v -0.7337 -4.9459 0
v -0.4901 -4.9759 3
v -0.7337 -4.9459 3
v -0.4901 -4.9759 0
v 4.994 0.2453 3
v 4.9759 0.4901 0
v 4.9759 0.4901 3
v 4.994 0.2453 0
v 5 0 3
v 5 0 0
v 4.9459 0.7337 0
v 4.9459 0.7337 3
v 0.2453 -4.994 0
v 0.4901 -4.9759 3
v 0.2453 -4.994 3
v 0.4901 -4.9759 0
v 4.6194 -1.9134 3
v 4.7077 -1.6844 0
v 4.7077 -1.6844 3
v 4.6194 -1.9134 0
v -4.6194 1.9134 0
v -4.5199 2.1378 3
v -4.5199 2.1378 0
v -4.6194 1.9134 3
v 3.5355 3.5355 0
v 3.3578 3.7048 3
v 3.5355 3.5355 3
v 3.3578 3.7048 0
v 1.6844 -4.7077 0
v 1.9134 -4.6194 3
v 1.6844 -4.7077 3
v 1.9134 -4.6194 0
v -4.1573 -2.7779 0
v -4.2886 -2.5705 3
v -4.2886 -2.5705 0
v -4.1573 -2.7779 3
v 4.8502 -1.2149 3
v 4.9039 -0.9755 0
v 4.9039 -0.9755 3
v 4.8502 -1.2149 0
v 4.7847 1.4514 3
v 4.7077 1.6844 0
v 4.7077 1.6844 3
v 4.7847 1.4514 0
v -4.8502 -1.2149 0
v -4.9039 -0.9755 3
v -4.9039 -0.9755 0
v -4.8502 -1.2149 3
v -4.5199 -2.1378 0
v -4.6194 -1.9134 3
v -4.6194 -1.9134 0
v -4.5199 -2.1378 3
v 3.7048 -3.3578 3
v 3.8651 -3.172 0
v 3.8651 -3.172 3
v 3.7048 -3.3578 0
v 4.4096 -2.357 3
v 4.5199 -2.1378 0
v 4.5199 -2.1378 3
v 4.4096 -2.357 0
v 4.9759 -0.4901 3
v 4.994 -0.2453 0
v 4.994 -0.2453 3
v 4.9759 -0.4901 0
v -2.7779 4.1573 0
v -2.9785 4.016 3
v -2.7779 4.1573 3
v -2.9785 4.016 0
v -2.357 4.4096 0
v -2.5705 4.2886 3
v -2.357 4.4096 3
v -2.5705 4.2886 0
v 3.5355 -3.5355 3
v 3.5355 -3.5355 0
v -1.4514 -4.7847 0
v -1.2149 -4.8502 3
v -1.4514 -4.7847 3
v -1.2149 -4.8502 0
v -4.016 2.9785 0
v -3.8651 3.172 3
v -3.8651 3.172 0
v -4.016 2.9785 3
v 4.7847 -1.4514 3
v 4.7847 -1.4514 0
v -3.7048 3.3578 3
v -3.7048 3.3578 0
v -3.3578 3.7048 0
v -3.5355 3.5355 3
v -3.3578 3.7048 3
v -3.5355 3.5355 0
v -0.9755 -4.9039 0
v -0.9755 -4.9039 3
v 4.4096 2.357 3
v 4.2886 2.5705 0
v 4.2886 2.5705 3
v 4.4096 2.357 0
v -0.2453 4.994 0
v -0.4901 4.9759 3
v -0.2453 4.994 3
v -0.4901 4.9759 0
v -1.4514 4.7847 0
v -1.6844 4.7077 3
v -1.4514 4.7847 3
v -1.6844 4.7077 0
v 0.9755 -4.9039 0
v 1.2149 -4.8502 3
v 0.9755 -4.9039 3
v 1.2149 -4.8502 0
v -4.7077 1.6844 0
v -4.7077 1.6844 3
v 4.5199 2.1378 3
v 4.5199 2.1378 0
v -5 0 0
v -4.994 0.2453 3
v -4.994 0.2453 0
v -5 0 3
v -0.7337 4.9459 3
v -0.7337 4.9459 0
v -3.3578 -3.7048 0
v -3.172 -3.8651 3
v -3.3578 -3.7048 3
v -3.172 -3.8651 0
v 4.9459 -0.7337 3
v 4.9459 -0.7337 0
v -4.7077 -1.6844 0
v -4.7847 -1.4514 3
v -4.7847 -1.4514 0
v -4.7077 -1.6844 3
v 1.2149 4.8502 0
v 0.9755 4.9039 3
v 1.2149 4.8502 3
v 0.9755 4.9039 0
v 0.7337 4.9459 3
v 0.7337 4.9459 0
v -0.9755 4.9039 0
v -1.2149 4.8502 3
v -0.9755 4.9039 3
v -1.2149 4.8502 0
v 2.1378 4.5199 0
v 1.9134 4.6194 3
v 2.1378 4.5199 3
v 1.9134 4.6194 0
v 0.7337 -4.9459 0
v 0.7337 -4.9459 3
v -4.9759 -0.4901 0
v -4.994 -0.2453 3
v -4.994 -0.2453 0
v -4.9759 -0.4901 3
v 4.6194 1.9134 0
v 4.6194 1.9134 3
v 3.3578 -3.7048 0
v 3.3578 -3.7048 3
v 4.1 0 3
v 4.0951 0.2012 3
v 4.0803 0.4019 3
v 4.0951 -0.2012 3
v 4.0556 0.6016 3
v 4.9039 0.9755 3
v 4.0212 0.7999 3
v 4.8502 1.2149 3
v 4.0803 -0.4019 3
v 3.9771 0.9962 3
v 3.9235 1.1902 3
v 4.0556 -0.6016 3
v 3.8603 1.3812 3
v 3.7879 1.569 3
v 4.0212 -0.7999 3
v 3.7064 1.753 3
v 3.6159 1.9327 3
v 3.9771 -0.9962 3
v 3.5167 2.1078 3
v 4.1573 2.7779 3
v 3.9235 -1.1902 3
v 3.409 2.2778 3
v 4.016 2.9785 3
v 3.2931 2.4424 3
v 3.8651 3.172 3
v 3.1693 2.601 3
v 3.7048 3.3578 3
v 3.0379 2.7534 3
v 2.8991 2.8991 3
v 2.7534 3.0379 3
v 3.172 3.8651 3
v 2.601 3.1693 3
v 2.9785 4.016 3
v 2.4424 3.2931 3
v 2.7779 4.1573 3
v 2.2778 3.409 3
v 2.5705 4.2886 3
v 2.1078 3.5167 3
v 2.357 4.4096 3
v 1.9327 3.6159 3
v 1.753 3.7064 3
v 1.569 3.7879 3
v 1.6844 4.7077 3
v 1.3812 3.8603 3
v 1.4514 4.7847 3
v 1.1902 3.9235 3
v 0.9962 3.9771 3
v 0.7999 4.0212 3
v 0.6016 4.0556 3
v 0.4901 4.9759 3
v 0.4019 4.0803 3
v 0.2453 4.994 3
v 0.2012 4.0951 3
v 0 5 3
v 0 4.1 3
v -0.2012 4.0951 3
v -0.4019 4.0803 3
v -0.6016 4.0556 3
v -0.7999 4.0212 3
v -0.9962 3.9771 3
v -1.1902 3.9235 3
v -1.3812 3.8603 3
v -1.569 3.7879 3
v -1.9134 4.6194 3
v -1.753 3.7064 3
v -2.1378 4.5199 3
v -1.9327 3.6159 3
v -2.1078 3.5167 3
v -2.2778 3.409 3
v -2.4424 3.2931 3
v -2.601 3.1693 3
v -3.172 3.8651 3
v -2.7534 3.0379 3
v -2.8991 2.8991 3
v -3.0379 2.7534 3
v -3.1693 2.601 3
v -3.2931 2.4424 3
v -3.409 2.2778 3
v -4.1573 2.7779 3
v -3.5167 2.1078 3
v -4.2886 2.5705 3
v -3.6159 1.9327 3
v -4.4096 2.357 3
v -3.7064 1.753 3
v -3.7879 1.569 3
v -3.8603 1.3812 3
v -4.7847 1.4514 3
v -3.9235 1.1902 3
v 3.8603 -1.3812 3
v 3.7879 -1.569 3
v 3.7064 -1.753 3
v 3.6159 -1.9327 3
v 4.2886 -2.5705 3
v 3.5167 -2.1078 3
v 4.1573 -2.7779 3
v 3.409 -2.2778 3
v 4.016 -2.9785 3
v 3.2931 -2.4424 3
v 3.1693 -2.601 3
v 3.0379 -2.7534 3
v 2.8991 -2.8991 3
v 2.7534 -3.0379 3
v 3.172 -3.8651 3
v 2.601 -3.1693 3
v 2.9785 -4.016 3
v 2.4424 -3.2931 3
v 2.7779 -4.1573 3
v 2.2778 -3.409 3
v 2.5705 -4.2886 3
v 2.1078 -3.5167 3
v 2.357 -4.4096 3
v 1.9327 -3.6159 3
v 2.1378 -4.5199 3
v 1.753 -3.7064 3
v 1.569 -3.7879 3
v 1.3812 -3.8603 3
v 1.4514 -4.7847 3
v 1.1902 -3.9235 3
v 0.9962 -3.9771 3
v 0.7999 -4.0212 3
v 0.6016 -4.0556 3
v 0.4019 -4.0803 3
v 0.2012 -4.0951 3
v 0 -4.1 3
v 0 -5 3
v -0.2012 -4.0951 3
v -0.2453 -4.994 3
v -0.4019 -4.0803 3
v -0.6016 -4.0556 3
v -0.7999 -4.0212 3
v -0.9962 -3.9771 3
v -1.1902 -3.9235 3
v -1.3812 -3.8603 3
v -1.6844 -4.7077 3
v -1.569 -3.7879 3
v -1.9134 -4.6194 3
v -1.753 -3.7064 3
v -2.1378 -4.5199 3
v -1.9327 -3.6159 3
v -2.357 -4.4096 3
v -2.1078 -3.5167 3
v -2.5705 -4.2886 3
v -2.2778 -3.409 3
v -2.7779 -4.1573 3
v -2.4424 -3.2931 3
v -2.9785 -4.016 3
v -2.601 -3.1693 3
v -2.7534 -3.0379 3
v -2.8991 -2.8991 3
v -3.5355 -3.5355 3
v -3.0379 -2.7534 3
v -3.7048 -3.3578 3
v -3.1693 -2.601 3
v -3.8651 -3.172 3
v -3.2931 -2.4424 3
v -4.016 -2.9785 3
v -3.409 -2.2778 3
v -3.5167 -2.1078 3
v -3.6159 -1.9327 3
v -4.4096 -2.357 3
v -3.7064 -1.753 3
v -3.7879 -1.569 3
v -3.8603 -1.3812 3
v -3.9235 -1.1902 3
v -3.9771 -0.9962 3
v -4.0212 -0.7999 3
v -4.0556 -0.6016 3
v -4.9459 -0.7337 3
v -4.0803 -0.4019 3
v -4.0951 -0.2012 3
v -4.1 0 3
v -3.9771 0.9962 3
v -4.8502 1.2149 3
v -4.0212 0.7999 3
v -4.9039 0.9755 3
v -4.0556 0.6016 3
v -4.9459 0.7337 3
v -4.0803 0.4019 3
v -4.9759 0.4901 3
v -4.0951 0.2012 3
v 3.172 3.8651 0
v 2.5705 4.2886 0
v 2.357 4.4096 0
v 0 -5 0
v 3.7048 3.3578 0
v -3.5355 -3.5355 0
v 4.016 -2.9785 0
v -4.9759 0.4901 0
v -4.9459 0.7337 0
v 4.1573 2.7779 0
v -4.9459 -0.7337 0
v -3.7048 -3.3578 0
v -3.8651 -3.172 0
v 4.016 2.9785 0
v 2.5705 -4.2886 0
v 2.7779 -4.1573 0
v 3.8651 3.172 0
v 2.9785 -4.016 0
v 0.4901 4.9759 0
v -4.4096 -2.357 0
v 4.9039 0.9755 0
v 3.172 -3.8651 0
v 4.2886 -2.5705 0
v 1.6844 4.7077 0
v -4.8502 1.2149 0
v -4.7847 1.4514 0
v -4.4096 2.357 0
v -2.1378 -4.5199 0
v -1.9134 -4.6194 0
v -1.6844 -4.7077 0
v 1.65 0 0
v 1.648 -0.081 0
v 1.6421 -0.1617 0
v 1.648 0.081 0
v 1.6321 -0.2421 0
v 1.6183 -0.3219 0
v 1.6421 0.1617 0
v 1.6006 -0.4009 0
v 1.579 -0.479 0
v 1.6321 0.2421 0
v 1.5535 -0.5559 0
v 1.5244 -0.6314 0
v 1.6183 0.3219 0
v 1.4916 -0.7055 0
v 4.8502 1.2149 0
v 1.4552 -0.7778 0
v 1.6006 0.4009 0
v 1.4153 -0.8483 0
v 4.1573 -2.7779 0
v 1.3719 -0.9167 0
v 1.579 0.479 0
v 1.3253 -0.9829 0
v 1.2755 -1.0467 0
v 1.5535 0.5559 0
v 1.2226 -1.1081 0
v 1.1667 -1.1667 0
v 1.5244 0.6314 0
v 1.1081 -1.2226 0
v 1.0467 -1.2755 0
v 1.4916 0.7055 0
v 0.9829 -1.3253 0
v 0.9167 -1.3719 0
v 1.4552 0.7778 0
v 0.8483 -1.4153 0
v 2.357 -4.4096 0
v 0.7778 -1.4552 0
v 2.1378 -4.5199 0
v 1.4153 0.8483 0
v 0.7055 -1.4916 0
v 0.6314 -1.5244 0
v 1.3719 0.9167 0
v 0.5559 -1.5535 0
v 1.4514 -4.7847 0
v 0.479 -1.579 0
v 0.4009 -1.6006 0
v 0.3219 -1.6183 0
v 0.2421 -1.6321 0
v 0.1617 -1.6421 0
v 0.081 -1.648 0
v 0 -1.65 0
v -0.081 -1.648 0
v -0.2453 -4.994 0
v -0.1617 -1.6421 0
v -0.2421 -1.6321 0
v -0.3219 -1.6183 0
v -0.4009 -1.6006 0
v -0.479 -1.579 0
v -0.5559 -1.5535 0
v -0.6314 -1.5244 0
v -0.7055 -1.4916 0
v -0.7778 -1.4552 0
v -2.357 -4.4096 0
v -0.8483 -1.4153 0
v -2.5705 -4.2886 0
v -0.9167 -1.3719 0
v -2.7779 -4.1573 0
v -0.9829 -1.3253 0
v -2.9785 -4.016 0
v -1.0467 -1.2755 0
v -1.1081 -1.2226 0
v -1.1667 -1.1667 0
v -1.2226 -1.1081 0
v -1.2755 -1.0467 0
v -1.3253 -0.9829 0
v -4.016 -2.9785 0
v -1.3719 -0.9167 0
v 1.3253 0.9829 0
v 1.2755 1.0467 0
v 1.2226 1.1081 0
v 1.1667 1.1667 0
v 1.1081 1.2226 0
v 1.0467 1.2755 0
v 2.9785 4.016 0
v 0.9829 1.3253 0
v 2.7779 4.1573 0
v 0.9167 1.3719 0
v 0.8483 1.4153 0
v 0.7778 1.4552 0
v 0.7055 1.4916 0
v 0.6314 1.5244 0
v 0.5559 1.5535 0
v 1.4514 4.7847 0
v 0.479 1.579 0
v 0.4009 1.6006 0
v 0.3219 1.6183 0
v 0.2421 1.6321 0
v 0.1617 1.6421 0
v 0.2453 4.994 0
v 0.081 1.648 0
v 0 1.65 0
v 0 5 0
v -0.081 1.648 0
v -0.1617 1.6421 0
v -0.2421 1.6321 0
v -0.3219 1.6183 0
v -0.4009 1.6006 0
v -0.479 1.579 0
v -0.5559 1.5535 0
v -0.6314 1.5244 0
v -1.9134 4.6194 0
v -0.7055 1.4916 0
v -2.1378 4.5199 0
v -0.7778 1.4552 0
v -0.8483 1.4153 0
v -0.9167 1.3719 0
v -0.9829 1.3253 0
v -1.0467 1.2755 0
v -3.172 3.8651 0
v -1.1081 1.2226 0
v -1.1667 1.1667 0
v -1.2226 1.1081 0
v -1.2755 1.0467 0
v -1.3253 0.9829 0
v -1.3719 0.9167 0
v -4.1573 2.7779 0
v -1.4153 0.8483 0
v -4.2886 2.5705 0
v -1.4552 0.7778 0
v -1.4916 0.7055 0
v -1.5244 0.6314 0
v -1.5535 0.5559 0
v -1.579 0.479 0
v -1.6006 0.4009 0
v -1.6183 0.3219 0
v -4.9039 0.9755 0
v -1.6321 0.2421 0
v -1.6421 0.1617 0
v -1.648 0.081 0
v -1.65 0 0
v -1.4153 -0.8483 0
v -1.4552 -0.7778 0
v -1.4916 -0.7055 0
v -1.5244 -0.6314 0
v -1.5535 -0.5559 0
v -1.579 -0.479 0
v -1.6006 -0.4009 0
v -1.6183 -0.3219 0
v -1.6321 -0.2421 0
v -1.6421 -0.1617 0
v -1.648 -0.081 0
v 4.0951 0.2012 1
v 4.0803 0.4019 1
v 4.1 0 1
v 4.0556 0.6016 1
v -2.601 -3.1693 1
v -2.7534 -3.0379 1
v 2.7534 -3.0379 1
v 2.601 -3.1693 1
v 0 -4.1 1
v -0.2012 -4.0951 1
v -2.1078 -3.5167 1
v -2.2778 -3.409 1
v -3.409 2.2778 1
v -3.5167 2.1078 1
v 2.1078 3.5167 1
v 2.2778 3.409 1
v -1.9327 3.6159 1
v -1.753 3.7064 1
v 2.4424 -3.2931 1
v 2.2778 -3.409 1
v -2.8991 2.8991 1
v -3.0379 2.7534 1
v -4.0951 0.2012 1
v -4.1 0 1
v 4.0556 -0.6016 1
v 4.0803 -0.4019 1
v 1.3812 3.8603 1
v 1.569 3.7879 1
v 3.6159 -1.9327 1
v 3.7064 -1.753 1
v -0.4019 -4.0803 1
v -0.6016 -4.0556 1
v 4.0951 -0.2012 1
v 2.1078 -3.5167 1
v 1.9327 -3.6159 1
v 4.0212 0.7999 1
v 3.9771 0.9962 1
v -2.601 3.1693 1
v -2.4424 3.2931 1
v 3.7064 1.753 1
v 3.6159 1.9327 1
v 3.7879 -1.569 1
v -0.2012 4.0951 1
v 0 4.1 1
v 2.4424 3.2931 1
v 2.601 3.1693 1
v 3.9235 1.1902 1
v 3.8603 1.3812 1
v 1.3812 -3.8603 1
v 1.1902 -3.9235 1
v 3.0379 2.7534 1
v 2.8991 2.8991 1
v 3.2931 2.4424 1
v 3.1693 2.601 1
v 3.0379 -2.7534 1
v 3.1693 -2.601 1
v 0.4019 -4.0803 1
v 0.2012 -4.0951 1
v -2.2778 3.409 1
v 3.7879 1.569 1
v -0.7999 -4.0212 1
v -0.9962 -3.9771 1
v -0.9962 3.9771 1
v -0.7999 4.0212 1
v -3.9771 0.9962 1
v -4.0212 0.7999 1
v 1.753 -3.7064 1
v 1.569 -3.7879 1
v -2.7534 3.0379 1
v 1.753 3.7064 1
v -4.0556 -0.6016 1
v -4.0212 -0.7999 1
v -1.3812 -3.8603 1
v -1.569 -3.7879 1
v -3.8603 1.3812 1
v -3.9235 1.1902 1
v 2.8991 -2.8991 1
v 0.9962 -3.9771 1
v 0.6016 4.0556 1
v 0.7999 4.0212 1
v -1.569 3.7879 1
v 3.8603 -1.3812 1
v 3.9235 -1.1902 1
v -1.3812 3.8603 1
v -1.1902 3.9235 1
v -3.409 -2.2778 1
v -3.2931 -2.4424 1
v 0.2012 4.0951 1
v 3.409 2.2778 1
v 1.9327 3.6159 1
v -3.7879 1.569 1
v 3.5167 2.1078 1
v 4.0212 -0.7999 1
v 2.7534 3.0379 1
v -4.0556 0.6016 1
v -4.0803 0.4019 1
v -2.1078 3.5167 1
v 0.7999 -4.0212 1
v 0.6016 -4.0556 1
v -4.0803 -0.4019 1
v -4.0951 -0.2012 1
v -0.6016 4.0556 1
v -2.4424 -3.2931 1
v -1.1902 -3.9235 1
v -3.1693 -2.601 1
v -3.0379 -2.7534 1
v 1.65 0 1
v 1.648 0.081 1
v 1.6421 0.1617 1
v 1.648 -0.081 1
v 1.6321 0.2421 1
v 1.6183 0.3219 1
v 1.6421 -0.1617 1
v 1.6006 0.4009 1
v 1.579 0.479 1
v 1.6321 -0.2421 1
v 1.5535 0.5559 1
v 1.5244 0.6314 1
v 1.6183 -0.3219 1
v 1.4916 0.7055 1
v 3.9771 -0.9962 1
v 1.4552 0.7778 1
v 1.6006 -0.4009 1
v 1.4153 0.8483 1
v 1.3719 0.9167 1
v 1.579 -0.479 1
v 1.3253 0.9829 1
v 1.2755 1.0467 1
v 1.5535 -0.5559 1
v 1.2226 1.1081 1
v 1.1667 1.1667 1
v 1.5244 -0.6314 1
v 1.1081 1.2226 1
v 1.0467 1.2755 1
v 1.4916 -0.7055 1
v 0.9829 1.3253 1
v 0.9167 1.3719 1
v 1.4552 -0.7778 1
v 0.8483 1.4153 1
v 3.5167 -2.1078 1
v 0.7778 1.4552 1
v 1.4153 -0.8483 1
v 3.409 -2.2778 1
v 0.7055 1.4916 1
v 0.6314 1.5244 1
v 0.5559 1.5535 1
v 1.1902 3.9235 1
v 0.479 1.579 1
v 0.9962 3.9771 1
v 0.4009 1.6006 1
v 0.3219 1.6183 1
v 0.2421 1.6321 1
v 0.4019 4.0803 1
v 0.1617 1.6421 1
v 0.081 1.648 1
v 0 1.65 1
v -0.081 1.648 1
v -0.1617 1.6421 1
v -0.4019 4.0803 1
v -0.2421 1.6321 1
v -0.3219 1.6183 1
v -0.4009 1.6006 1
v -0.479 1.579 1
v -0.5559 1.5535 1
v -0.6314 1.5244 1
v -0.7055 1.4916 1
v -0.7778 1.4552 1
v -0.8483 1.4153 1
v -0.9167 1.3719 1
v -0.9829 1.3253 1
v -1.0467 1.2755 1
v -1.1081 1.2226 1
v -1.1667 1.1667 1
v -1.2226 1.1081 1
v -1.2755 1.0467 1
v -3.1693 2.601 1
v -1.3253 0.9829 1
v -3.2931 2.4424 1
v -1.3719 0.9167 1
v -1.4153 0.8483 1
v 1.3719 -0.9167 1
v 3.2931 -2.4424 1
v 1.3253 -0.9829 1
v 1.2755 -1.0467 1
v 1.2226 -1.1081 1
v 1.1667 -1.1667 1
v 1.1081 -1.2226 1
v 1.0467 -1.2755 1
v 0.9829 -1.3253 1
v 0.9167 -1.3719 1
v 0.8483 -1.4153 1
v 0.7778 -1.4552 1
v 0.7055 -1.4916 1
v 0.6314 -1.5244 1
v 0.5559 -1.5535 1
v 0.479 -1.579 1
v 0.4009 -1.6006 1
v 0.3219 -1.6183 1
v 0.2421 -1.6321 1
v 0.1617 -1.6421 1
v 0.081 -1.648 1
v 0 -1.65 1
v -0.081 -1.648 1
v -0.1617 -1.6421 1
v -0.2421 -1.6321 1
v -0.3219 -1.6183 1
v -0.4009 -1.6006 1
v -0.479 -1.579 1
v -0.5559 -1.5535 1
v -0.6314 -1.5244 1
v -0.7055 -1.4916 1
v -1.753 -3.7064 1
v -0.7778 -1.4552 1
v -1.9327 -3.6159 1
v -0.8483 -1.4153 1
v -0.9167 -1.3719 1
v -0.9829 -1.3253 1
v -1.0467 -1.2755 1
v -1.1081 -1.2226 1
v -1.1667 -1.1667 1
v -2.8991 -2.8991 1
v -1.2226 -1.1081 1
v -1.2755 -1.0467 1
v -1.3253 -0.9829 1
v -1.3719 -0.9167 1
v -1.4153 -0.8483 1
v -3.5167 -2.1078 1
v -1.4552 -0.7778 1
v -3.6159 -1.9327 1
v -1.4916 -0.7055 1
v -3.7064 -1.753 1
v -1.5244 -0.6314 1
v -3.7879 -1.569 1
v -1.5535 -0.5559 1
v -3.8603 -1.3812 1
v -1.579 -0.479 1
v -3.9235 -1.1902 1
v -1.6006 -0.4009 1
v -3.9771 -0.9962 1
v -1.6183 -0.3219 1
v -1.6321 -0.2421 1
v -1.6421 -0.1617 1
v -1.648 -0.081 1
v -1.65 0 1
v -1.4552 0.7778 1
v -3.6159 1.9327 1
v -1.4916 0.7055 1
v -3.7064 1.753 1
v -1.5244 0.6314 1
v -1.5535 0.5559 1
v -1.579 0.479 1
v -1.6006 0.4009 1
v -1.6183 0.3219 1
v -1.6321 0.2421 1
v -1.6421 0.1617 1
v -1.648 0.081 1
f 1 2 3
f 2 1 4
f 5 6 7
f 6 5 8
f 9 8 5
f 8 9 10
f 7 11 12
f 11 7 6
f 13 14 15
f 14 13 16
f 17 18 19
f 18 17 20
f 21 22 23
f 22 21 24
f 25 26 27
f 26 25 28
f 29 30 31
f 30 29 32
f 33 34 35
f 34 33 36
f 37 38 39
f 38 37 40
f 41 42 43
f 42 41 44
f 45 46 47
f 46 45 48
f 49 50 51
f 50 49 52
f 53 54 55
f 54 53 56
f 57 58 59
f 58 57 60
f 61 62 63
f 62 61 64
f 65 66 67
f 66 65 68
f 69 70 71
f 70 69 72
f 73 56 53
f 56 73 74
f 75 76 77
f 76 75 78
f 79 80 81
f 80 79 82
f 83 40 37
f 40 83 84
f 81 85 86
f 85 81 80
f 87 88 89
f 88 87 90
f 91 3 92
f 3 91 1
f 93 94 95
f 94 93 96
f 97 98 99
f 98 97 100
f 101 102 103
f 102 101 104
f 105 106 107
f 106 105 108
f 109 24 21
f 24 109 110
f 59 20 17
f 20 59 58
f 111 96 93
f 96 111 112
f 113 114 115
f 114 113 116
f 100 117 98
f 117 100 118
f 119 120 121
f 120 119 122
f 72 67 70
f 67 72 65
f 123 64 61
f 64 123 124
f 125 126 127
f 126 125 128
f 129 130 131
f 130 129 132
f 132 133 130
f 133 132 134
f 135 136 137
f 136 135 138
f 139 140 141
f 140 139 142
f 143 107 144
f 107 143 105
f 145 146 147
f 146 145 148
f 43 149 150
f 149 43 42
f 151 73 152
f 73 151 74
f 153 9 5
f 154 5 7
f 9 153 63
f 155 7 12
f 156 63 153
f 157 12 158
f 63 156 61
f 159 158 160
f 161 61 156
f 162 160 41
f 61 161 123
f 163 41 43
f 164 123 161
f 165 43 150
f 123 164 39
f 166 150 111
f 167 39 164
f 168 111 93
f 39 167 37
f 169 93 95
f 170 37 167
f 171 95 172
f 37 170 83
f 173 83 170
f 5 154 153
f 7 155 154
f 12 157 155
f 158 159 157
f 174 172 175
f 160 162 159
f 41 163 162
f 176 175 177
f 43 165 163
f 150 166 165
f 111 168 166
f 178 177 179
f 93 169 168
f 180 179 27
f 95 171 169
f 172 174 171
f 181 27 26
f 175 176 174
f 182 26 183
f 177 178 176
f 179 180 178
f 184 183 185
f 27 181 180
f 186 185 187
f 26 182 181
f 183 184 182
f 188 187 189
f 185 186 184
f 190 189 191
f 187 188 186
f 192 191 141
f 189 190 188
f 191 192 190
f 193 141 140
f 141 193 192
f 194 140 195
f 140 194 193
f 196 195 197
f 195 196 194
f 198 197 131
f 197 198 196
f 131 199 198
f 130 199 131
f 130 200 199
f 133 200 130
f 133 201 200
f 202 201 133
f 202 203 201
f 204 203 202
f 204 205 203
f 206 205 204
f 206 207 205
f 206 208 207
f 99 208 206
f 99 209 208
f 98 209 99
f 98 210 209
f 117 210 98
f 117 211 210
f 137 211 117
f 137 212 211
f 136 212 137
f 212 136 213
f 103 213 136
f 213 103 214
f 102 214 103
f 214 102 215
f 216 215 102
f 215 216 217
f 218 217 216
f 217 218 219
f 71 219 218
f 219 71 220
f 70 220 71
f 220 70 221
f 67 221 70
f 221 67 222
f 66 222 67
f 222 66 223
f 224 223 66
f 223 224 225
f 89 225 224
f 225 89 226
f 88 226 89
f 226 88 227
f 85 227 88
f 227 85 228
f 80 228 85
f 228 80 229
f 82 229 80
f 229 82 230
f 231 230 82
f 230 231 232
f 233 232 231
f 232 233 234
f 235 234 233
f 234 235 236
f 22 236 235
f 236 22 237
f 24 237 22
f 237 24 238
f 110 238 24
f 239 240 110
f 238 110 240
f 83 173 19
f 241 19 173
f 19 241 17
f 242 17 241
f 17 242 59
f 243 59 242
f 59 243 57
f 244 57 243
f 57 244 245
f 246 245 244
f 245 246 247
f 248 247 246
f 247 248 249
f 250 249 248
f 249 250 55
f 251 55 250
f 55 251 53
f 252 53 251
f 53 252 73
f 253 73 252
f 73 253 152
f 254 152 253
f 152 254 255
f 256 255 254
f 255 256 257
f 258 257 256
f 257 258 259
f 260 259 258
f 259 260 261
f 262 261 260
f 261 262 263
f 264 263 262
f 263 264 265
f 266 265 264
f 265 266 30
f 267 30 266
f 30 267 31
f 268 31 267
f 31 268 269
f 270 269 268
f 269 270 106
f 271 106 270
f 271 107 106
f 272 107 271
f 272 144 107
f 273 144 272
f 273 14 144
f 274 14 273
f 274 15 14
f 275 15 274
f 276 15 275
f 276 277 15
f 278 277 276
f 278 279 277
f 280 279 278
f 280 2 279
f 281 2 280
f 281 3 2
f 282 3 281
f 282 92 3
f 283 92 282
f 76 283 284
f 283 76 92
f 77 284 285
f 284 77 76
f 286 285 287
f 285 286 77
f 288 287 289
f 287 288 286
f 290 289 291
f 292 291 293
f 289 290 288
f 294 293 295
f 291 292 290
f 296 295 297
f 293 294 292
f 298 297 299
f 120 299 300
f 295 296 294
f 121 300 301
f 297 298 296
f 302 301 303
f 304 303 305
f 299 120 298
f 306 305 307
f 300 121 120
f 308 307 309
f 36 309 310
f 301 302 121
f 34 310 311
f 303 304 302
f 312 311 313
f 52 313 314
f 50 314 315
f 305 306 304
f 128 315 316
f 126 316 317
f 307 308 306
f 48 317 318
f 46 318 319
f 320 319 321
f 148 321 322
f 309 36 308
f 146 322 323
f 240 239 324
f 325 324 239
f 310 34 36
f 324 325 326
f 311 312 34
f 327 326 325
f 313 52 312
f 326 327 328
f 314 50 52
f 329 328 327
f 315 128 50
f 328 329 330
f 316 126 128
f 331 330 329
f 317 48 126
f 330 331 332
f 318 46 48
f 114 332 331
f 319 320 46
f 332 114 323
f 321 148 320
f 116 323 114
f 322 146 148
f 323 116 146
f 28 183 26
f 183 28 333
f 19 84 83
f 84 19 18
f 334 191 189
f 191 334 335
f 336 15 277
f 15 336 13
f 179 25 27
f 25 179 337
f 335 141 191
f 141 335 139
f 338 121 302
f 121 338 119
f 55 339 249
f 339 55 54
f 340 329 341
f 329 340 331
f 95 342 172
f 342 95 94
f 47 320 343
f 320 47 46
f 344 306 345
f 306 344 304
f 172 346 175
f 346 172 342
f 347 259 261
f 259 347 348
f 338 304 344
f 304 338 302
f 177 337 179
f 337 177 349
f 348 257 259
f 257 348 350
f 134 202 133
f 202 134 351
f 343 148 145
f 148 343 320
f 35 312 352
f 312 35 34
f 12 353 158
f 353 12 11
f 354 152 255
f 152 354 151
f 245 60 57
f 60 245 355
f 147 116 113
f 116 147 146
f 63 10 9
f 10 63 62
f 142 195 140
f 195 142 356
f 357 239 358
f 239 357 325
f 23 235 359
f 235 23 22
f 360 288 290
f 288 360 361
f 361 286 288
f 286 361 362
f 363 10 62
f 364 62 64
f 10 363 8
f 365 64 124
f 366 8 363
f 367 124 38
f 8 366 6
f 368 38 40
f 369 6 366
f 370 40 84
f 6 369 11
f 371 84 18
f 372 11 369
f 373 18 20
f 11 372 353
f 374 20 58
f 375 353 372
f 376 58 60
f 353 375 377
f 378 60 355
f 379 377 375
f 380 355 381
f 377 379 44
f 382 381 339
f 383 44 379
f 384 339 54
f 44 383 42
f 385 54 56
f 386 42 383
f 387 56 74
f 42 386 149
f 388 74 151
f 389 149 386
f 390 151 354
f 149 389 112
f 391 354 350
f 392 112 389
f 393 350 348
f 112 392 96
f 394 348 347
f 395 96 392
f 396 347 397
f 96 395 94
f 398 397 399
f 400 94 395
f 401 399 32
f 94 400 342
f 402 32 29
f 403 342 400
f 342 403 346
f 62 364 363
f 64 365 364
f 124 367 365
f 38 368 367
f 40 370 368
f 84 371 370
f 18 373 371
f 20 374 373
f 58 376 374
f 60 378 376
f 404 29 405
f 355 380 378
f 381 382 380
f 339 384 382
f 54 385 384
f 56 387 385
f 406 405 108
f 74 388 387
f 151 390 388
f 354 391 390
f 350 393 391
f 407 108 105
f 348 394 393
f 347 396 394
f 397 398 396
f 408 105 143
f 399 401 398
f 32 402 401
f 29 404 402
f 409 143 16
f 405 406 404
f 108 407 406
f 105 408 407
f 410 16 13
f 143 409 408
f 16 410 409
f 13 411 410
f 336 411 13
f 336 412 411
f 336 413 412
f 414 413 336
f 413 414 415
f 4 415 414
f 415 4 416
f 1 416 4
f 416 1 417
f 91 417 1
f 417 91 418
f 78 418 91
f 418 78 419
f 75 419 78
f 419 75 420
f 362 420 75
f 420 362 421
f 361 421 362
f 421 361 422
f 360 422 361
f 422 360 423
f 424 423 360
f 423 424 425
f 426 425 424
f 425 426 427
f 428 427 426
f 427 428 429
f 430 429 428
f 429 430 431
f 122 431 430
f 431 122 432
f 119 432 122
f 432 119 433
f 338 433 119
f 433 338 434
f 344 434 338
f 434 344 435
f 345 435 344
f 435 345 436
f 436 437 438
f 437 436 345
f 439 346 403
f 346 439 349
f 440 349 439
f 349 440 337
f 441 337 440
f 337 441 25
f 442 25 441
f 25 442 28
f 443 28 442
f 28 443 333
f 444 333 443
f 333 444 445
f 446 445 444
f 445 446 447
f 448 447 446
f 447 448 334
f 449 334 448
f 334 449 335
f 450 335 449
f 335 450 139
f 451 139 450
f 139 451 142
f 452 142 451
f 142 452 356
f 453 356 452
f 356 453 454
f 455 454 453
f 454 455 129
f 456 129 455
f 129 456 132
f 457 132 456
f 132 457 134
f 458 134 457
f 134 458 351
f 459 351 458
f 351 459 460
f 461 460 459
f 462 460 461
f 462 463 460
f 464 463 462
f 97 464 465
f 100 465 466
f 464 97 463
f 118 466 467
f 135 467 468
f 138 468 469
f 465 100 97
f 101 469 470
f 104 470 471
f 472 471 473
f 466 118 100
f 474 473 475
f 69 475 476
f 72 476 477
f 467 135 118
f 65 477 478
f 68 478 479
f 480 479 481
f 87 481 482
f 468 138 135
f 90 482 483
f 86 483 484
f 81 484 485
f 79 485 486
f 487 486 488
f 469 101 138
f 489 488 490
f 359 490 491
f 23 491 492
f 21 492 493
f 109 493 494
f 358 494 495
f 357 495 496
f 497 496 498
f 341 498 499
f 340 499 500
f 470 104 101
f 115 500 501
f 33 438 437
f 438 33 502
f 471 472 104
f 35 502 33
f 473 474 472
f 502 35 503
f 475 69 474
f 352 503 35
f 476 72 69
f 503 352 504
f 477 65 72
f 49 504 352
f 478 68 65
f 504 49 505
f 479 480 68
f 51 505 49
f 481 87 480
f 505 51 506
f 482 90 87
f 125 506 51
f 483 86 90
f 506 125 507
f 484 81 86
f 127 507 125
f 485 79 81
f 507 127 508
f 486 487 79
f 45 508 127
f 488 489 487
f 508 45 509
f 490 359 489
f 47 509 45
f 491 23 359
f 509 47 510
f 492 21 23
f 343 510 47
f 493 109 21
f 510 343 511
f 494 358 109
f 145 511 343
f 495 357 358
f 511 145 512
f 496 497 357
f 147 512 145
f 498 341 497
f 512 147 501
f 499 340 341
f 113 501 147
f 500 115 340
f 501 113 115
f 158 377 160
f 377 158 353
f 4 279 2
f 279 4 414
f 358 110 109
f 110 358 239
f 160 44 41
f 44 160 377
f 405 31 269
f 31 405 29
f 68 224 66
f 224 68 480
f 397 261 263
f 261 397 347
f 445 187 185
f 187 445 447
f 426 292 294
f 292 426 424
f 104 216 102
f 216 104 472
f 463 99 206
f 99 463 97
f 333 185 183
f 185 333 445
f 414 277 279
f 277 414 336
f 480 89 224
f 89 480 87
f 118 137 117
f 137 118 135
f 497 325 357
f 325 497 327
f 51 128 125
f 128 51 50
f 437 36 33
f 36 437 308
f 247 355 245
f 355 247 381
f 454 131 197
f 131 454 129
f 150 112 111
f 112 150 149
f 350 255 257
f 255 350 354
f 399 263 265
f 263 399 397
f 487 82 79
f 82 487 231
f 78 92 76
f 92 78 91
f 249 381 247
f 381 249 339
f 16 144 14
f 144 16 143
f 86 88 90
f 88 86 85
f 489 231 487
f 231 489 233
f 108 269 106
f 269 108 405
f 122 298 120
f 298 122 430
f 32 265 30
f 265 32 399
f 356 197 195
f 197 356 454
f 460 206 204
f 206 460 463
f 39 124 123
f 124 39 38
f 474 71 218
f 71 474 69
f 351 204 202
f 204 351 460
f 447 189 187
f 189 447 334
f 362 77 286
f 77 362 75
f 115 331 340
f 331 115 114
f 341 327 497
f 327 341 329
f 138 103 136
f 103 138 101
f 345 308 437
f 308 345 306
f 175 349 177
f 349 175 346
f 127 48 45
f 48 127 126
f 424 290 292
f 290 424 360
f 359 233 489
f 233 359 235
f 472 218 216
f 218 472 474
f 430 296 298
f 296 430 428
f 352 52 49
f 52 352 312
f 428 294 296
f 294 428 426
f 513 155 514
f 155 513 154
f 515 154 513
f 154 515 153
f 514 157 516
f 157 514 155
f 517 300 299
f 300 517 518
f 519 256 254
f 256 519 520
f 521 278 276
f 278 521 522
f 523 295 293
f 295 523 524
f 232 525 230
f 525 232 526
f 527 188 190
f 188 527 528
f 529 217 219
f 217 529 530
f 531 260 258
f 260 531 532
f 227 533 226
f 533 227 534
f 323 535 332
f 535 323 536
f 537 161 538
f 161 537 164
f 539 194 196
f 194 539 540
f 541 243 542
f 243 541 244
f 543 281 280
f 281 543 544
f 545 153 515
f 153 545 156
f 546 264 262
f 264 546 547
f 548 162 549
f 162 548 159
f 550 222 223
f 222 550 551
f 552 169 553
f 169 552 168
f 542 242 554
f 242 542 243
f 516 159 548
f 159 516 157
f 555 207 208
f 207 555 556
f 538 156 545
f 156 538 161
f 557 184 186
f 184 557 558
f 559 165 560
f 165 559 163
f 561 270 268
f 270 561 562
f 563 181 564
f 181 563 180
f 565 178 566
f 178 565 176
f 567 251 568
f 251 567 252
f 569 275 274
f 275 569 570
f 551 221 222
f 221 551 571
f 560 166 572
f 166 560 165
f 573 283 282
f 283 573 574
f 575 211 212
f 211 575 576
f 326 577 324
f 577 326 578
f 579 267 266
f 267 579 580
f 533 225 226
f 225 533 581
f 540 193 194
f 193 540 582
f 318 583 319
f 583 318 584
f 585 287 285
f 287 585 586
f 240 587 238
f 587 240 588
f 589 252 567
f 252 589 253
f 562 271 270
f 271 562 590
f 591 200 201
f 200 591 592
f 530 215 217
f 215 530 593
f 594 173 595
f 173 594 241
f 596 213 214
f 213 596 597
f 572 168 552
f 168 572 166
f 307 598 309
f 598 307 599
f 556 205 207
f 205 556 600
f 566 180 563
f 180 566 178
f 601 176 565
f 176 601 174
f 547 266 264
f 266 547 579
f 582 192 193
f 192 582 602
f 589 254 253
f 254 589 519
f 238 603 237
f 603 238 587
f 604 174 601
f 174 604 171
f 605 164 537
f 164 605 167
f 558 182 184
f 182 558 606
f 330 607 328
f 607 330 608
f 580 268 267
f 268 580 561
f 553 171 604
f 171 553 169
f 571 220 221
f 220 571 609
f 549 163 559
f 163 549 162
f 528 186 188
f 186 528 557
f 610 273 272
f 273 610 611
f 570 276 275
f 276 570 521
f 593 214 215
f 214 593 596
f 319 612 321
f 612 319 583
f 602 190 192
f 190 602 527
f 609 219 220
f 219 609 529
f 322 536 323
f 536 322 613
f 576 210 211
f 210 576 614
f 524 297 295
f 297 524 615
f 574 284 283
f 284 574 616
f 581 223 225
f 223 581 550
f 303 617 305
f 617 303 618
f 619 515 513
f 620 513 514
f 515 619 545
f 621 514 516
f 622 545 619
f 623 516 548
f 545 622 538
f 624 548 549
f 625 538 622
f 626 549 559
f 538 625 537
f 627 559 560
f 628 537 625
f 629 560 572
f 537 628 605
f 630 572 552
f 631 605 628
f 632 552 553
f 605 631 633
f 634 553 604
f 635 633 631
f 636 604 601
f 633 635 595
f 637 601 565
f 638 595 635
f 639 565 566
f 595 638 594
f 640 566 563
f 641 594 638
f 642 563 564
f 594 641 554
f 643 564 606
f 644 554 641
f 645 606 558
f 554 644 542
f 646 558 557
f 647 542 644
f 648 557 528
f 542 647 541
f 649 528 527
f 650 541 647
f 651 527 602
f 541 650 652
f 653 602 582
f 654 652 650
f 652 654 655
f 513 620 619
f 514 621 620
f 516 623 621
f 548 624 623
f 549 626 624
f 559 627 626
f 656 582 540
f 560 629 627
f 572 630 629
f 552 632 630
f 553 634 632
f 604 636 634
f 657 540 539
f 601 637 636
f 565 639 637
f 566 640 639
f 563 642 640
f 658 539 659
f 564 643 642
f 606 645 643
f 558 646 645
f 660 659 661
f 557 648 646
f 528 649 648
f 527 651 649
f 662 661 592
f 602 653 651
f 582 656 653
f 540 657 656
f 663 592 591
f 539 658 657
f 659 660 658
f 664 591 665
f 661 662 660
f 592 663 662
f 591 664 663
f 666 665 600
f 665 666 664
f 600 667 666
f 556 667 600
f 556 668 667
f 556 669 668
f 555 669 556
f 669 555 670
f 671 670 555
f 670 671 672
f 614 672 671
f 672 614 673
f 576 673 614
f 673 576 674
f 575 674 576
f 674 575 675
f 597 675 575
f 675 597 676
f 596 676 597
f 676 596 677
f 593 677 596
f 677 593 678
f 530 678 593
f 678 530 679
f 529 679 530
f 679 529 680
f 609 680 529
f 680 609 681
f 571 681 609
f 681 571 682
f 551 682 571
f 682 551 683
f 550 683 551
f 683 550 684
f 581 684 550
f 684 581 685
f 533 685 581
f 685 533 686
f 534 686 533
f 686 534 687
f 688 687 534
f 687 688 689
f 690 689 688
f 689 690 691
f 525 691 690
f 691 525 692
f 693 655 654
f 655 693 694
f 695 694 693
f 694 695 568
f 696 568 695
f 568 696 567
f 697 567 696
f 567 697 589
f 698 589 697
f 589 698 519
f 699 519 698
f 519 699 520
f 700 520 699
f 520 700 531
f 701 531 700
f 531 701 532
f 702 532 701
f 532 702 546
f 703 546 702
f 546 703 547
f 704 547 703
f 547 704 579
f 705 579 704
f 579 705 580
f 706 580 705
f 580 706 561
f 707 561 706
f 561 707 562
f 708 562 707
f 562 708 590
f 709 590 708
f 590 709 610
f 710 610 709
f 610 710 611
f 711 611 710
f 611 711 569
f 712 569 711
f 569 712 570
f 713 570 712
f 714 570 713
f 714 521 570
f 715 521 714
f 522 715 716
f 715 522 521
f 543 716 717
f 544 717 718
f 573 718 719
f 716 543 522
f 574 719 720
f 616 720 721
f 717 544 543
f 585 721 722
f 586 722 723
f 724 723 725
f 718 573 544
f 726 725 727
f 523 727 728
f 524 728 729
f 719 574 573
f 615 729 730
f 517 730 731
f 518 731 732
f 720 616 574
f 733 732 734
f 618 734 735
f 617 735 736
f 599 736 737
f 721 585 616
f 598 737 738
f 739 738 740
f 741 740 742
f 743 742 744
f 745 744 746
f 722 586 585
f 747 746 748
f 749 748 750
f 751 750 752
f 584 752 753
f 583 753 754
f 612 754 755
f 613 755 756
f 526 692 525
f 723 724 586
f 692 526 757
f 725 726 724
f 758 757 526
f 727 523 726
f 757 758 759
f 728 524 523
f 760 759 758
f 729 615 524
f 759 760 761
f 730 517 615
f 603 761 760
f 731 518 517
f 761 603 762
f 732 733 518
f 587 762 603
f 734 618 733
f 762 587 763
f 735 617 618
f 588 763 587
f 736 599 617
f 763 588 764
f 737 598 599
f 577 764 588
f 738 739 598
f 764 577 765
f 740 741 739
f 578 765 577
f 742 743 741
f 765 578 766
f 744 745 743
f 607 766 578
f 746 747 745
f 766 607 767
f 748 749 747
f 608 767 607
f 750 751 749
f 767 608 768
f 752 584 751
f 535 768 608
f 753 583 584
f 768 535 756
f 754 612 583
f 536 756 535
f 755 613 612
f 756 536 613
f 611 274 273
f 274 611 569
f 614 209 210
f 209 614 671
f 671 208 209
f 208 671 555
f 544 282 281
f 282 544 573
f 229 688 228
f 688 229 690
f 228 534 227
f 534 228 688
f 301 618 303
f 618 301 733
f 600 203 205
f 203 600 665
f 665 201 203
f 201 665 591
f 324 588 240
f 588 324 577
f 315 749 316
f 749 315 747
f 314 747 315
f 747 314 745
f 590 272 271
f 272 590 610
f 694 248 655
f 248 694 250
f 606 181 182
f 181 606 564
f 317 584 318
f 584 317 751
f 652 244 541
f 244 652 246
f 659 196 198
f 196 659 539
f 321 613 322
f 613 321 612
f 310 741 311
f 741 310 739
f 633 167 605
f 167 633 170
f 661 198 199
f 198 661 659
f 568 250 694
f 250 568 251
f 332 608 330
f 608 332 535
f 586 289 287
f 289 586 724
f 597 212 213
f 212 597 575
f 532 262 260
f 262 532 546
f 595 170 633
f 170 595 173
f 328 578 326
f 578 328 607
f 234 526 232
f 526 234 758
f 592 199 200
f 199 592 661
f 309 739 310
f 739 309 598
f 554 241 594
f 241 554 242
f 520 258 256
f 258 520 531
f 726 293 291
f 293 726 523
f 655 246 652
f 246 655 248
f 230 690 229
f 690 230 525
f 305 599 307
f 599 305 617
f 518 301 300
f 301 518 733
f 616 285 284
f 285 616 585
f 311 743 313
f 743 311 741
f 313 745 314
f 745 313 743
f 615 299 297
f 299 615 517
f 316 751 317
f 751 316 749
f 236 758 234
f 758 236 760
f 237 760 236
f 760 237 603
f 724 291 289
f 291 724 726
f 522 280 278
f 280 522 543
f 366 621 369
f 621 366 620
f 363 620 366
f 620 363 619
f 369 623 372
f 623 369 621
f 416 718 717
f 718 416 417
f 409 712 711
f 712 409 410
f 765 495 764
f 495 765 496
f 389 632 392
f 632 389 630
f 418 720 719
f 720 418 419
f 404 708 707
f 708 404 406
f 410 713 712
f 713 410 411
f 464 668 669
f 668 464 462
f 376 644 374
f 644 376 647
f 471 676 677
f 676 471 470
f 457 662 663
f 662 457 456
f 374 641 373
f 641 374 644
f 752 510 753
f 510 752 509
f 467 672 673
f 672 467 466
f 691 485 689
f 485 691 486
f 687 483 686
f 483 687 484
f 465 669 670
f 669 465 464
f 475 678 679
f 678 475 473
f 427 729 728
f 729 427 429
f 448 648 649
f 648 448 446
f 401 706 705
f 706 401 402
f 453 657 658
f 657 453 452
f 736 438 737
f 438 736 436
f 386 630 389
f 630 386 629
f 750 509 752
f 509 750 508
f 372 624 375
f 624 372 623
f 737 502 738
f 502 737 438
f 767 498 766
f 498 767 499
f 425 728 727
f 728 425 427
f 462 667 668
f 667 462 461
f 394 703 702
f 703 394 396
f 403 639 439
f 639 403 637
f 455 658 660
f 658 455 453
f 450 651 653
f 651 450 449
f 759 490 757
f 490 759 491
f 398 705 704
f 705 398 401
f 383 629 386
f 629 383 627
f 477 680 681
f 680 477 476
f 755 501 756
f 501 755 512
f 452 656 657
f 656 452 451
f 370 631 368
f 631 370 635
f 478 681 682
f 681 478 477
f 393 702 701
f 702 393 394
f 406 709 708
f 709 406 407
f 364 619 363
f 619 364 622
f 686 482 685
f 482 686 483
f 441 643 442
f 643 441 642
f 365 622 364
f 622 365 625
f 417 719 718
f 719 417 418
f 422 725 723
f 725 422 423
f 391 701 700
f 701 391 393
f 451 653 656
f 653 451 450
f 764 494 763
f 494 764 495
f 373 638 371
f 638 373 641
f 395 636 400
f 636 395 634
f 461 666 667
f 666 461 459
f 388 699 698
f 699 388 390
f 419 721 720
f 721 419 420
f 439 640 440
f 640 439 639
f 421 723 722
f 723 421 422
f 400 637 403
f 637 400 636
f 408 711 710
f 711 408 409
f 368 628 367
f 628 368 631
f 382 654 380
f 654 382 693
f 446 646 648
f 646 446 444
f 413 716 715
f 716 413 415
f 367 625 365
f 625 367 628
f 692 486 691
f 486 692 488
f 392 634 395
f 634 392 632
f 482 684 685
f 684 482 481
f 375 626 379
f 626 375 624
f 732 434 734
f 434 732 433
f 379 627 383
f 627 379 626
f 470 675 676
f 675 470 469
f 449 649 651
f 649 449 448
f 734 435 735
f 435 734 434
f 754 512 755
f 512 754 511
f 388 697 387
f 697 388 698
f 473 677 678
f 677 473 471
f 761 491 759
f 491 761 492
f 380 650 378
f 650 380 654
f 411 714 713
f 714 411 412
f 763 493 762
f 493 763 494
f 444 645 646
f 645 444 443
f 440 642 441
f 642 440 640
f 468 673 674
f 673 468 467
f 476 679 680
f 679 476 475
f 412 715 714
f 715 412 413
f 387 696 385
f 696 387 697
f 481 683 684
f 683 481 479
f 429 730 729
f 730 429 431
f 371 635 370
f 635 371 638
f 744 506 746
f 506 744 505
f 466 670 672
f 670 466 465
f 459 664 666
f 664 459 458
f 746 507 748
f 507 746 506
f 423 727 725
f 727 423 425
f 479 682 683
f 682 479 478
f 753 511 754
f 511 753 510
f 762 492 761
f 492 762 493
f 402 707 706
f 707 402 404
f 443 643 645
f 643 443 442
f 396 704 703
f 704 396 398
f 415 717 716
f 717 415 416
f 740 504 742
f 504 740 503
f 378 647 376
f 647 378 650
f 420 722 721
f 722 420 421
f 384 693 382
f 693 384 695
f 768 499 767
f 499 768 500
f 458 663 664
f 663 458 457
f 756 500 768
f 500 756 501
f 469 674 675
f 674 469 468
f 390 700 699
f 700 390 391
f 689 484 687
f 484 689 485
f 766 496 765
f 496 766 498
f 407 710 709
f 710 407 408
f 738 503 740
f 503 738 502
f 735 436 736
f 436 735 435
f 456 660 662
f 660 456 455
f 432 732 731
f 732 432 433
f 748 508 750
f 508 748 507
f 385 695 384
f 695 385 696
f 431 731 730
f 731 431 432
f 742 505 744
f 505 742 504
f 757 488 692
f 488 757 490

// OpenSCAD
$fn=128;

od=10;
id=8.2;

difference()
{
    cylinder(d=od,h=3);
    translate([0,0,1])
    cylinder(d=id,h=3);
    
    translate([0,0,-1])
    cylinder(d=3.3,h=10);
}
